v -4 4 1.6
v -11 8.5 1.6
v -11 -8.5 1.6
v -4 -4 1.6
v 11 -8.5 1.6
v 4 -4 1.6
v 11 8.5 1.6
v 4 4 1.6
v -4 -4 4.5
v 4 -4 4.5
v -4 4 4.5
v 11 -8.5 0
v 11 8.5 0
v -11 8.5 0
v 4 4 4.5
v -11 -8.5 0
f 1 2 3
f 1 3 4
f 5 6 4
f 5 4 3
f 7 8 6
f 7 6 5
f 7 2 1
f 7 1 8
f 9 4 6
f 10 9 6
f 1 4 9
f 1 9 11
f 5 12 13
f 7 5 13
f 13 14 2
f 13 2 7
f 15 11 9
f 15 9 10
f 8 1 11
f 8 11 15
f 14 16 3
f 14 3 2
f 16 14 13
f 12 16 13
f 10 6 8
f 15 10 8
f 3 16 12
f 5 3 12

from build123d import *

# Parameters (mm, degrees)
SKETCH1_W      = 22
SKETCH1_H      = 17
PCB_DEPTH      = 1.6
SKETCH2_W      = 8
SKETCH2_H      = 8
INDUCTOR_DEPTH = 2.9


with BuildPart() as part:
    # Sketch1 → PCB (new body)
    with BuildSketch(Plane.XY):
        Rectangle(SKETCH1_W, SKETCH1_H)
    extrude(amount=PCB_DEPTH)

    # Sketch2 → Inductor (add)
    with BuildSketch(Plane.XY.offset(1.6)):
        Rectangle(SKETCH2_W, SKETCH2_H)
    extrude(amount=INDUCTOR_DEPTH)


solid = part.part
